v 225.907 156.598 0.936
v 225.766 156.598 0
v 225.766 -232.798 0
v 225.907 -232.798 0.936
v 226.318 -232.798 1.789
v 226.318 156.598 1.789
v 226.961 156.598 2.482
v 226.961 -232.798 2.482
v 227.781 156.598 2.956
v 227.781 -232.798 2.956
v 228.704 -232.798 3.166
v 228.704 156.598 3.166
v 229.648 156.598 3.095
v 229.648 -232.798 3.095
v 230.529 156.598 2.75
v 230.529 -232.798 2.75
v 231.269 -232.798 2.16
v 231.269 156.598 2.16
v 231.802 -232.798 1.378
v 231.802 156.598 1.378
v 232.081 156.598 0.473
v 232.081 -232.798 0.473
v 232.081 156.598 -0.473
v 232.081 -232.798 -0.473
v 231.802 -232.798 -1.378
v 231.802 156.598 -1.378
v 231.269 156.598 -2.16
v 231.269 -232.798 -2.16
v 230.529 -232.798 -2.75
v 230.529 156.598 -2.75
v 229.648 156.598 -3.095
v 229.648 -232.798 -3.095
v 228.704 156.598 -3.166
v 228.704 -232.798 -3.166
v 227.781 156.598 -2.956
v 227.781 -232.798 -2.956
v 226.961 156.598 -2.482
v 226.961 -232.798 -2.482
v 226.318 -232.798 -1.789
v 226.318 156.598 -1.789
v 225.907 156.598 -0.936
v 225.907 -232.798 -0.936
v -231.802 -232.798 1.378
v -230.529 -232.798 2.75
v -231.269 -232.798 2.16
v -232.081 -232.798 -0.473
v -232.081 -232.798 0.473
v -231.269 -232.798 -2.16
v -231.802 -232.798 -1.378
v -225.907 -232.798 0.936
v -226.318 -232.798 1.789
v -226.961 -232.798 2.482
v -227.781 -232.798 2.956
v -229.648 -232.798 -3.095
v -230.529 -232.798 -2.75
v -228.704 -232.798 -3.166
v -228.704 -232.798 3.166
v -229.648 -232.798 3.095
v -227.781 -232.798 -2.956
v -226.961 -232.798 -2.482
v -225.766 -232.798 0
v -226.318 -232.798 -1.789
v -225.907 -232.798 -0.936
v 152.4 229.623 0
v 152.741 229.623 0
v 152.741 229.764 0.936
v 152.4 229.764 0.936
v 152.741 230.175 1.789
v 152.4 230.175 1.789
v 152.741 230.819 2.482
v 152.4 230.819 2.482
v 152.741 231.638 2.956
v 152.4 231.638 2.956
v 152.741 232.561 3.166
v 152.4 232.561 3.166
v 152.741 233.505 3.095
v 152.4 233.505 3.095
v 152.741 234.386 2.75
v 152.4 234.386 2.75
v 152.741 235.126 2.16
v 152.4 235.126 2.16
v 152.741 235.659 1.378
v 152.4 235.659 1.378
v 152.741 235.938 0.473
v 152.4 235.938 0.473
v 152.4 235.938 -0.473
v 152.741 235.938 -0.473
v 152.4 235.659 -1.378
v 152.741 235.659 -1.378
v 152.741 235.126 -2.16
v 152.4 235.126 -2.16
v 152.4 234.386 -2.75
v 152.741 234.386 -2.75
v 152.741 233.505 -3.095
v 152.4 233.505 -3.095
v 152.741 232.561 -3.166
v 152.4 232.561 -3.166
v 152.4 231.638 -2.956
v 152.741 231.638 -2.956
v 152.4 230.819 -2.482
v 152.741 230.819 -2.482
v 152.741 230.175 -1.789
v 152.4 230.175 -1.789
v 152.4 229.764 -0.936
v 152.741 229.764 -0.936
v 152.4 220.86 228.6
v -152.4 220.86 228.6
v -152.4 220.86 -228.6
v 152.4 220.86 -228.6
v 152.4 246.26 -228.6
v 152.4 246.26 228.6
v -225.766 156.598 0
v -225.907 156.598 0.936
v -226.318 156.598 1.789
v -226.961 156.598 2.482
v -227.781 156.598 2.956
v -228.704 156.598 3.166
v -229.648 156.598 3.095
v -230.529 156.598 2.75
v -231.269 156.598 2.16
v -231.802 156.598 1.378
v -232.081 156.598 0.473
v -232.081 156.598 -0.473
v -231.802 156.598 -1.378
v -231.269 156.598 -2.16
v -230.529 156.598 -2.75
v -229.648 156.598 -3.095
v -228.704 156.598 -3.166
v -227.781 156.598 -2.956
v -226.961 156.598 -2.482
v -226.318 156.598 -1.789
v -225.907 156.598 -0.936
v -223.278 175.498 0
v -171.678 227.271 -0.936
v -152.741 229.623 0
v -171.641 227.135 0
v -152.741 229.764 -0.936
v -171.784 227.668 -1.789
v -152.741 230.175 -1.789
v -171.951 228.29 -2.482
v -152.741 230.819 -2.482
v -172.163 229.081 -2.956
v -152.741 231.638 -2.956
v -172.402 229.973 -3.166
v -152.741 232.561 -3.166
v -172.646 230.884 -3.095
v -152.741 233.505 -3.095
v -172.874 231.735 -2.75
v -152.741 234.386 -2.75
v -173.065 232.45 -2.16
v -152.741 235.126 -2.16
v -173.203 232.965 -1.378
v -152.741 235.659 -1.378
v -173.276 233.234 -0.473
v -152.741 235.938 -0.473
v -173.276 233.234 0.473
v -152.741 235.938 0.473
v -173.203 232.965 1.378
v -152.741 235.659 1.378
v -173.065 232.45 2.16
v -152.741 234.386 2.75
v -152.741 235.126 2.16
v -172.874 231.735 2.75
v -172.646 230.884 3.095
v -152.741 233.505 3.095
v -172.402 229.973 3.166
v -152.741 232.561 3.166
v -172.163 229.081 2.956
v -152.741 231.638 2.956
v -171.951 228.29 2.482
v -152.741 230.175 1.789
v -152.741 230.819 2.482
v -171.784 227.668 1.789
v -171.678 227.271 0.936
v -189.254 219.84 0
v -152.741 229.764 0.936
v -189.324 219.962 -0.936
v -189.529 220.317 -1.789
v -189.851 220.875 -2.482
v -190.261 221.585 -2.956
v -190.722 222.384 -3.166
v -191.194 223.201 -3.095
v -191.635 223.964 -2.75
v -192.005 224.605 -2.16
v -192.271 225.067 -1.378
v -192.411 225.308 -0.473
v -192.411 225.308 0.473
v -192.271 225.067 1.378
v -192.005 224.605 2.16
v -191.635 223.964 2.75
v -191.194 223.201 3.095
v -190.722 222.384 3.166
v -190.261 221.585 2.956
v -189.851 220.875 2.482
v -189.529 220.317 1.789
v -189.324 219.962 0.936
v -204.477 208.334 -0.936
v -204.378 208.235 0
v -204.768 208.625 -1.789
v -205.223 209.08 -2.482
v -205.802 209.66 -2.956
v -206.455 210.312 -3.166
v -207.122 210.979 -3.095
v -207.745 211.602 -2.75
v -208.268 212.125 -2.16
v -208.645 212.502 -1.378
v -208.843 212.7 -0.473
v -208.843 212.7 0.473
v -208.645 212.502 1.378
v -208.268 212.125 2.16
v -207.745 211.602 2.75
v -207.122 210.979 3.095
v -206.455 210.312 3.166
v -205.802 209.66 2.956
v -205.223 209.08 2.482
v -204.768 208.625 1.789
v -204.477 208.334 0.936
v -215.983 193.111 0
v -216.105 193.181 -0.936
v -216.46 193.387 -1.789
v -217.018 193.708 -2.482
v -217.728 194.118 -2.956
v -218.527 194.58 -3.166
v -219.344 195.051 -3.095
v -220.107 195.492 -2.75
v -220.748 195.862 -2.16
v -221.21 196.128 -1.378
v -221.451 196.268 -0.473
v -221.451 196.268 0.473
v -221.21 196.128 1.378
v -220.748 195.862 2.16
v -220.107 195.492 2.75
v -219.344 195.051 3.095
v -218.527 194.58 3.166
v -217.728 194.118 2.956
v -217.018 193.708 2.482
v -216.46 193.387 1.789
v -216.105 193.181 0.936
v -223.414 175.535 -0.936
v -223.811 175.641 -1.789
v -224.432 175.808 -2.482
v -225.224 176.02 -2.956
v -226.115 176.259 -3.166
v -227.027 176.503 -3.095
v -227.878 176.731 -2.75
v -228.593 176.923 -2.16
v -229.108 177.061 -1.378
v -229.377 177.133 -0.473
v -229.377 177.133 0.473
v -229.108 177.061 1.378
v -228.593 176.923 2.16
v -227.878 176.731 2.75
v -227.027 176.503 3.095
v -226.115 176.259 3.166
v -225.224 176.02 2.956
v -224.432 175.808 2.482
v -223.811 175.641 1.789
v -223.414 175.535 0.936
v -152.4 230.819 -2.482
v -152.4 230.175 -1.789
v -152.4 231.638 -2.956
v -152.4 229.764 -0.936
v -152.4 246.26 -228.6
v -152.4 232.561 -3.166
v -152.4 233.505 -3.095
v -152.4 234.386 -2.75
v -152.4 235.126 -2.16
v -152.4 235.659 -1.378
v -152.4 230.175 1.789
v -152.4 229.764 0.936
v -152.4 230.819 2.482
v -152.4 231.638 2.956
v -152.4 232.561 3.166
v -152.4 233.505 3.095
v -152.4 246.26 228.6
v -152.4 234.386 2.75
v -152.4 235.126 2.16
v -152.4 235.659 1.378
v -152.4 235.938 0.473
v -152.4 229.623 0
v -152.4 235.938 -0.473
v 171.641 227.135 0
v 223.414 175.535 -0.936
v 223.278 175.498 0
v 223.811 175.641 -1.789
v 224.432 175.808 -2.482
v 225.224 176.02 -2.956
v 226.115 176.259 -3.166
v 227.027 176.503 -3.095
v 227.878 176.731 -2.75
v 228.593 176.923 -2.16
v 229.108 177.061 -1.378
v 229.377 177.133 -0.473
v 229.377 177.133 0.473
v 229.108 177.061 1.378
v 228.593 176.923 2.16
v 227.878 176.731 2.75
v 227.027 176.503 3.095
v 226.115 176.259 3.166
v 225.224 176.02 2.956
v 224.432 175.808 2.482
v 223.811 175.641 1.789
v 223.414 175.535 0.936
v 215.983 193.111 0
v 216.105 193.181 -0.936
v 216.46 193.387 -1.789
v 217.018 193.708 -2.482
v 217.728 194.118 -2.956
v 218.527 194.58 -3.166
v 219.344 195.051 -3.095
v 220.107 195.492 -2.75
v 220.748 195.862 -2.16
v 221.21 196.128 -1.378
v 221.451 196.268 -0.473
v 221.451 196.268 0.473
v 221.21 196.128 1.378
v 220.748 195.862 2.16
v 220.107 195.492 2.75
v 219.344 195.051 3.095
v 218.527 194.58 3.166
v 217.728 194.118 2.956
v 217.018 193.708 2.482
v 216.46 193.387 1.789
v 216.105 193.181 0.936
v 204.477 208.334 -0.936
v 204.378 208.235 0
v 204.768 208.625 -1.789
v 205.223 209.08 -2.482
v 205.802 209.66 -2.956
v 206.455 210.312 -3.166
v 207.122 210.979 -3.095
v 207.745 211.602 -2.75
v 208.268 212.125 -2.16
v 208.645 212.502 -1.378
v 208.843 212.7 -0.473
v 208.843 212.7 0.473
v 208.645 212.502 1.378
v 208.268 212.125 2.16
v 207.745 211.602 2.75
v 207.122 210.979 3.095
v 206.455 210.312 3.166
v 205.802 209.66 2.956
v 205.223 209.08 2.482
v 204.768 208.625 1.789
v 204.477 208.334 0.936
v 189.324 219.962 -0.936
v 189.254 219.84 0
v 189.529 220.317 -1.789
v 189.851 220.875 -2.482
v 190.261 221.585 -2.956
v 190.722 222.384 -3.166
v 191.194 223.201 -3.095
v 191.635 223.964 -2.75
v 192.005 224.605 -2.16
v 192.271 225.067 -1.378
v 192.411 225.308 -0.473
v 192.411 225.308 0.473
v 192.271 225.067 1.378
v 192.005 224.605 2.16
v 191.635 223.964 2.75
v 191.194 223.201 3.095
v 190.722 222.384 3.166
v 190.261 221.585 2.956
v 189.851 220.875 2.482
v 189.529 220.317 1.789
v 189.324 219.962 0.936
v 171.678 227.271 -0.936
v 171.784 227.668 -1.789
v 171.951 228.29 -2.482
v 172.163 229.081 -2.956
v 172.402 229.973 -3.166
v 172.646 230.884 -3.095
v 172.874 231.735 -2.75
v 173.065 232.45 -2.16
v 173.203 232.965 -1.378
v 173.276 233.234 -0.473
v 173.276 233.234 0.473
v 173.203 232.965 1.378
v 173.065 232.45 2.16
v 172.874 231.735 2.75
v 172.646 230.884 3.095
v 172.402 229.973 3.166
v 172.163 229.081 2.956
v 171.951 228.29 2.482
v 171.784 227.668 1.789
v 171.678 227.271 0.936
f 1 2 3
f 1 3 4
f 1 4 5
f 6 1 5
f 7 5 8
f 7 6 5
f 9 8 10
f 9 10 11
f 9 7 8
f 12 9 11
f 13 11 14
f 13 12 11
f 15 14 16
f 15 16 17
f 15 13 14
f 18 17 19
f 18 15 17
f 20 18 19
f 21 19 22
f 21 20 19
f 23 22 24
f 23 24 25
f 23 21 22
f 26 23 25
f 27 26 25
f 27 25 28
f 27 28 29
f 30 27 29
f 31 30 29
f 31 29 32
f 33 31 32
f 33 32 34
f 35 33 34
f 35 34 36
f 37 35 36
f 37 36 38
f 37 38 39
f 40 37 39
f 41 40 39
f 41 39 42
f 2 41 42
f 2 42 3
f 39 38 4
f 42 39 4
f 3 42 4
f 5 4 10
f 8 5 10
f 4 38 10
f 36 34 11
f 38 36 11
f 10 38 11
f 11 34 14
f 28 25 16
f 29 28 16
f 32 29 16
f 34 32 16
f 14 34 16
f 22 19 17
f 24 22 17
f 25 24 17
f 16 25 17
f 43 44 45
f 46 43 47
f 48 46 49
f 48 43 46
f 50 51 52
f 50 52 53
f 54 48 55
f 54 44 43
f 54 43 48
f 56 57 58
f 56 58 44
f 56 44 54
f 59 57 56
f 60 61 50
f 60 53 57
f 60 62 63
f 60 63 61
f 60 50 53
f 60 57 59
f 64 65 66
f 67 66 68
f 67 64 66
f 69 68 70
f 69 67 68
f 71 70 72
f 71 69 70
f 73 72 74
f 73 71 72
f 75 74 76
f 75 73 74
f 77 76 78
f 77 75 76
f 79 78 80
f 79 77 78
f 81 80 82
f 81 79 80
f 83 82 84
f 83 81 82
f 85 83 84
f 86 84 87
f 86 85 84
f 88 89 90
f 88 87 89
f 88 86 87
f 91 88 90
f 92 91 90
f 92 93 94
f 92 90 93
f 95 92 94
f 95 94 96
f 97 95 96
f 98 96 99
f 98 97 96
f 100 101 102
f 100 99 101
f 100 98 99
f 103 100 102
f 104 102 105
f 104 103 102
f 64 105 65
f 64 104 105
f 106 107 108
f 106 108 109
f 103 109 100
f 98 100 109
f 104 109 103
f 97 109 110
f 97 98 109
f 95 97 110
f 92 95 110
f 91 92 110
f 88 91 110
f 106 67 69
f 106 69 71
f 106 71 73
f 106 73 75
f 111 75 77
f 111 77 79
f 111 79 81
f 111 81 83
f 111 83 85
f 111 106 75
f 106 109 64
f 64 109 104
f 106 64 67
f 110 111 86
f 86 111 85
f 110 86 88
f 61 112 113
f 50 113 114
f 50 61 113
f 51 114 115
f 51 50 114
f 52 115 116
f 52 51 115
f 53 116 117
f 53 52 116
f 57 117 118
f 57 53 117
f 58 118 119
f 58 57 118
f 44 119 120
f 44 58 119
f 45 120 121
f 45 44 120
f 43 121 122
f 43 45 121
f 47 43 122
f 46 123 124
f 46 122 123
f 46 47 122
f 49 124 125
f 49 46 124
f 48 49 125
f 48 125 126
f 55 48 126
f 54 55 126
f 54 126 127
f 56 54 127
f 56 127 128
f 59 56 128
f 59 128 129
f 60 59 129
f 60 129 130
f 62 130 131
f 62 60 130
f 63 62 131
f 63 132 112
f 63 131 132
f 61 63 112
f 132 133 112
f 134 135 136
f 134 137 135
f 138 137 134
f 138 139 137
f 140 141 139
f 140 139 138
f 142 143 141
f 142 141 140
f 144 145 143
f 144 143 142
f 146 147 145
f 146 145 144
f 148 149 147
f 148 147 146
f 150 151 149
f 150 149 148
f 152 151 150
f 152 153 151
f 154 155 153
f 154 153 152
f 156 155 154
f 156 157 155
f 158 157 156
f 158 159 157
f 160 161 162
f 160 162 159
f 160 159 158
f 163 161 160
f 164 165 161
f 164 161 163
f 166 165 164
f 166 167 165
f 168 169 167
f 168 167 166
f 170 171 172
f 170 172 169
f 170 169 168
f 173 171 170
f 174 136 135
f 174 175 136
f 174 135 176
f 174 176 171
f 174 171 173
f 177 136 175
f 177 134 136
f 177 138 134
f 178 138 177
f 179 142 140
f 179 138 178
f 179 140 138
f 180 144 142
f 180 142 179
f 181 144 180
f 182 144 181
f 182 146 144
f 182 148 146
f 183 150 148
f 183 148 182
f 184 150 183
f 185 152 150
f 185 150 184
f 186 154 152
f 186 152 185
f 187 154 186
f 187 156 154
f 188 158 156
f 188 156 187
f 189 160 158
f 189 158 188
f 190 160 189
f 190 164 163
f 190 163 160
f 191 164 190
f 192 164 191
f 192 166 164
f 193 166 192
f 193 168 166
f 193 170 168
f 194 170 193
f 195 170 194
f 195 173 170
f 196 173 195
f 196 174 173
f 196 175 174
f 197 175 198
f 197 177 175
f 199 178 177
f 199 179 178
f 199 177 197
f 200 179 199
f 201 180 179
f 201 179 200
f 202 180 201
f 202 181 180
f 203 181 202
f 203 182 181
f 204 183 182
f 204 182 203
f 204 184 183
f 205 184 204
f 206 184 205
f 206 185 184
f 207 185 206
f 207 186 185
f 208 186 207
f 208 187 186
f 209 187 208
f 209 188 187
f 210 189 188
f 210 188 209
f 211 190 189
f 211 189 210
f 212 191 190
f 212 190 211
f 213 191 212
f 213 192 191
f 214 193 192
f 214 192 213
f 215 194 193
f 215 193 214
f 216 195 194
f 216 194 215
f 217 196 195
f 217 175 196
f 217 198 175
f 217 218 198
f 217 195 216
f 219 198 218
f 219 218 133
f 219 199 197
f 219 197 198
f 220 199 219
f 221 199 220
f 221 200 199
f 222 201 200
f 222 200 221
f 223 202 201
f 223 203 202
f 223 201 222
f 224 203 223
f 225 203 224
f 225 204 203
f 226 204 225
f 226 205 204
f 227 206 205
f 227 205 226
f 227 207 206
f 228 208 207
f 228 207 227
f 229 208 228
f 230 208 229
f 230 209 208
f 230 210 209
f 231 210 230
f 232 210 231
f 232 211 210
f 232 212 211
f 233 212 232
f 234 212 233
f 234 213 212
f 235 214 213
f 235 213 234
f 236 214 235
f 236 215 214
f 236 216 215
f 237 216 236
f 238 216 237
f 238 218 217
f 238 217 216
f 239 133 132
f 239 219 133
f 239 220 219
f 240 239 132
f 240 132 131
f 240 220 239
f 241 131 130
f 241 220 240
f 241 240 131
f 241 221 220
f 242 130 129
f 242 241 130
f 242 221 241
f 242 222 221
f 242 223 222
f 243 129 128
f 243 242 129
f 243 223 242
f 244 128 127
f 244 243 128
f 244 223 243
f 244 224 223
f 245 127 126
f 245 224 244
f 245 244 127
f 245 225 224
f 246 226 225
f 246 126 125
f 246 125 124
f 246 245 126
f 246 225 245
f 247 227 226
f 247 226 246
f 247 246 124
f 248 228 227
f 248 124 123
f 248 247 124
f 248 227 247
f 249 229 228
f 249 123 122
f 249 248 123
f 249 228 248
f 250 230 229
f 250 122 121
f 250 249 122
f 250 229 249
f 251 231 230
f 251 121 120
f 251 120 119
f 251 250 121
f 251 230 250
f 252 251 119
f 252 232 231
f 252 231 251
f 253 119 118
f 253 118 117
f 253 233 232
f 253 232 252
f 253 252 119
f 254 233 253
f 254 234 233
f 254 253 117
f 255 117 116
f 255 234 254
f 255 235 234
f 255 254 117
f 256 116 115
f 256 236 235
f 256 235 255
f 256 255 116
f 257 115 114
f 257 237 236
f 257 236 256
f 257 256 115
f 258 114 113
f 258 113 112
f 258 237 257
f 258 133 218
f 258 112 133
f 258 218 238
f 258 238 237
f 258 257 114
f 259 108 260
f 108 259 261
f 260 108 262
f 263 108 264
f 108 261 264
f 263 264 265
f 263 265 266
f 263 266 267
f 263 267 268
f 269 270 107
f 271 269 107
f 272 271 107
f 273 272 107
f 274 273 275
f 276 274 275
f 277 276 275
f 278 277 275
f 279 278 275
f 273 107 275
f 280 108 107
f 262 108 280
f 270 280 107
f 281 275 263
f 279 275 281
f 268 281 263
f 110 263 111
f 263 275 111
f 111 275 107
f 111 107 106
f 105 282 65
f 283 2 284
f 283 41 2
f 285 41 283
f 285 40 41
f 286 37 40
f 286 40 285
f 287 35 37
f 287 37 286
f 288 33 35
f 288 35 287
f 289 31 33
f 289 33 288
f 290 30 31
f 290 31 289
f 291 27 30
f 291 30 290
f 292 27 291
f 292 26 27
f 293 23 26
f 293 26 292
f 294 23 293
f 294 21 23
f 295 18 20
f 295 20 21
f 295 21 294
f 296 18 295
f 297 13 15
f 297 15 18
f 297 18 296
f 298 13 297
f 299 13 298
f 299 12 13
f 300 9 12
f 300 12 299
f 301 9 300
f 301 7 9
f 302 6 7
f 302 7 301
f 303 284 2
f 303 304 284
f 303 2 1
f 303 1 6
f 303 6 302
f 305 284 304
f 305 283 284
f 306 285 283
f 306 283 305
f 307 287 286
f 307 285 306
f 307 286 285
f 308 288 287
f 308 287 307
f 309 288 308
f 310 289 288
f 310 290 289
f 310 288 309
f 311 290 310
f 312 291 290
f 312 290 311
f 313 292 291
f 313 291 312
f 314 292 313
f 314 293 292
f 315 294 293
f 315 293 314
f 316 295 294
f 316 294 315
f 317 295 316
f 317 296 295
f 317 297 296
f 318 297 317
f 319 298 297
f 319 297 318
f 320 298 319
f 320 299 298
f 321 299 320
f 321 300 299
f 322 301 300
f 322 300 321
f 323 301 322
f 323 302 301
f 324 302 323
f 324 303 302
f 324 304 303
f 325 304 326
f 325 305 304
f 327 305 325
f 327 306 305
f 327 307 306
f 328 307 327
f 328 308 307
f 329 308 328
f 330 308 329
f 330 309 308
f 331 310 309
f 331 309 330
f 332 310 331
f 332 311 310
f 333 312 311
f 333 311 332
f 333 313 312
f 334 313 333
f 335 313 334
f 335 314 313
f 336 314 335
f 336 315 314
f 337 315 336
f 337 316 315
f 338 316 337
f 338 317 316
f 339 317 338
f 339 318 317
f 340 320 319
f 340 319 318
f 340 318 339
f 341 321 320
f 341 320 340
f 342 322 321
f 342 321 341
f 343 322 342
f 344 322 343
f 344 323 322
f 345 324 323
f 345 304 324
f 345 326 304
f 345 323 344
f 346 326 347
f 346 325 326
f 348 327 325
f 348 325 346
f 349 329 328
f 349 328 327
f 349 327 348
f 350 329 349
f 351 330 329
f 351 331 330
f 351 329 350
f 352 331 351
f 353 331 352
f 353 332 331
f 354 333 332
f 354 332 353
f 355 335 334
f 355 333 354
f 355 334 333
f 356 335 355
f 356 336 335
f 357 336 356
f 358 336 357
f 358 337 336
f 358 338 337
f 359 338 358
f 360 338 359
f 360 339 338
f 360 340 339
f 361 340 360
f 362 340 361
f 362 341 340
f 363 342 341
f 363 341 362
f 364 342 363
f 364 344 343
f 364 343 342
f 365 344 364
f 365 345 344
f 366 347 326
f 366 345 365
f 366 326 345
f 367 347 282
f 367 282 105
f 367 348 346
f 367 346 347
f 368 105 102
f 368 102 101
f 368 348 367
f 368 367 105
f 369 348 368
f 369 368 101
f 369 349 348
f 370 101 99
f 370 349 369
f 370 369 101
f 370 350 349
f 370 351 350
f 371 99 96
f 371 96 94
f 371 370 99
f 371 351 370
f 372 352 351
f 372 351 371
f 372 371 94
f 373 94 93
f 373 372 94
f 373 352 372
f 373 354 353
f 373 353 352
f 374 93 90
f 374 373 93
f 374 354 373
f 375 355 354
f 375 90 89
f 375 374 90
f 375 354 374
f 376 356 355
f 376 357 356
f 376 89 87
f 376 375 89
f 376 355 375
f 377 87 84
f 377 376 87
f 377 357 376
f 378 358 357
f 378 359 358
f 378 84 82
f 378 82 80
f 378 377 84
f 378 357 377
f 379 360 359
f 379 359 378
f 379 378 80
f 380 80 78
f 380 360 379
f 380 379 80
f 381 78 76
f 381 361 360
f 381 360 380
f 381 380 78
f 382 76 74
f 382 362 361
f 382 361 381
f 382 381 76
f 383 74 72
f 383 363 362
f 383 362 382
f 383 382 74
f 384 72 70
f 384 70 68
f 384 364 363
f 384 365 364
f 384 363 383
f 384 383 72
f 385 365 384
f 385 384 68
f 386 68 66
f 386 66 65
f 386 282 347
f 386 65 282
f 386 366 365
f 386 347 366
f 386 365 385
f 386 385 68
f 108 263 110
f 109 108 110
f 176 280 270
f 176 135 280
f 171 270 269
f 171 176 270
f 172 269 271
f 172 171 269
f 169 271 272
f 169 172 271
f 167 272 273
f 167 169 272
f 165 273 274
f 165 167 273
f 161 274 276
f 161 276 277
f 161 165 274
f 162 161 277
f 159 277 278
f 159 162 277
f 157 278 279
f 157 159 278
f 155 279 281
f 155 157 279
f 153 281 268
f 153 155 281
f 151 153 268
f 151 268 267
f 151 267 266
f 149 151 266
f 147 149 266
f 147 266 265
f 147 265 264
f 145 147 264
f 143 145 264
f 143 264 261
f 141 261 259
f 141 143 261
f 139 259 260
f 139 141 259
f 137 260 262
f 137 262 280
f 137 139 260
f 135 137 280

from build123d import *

# Parameters (mm, degrees)
F1_R     = 3.175
F3_W     = 304.8
F3_H     = 25.4
F4_DEPTH = 228.6


with BuildPart() as f2:
    # F2: sweep along a path in F0
    with BuildLine(Plane.XY) as f2_path:
        Line((228.9410829544, -232.7981889248), (228.9410829544, 156.5981889248))
        ThreePointArc((228.9410829544, 156.5981889248), (206.6226196808, 210.4797256512), (152.7410829544, 232.7981889248))
        Line((152.7410829544, 232.7981889248), (-152.7410829544, 232.7981889248))
        ThreePointArc((-152.7410829544, 232.7981889248), (-206.6226196808, 210.4797256512), (-228.9410829544, 156.5981889248))
        Line((-228.9410829544, 156.5981889248), (-228.9410829544, -232.7981889248))
    # F1 (on Front) → F2 (sweep)
    with BuildSketch(Plane.XZ):
        with Locations((-228.9410680532, 0)):
            Circle(F1_R)
    sweep(path=f2_path.line)

    # F3 (on Top) → F4 (join, symmetric)
    with BuildSketch(Plane.XY):
        with Locations((0, 233.5601756576)):
            Rectangle(F3_W, F3_H)
    extrude(amount=F4_DEPTH, both=True)


solid = f2.part
